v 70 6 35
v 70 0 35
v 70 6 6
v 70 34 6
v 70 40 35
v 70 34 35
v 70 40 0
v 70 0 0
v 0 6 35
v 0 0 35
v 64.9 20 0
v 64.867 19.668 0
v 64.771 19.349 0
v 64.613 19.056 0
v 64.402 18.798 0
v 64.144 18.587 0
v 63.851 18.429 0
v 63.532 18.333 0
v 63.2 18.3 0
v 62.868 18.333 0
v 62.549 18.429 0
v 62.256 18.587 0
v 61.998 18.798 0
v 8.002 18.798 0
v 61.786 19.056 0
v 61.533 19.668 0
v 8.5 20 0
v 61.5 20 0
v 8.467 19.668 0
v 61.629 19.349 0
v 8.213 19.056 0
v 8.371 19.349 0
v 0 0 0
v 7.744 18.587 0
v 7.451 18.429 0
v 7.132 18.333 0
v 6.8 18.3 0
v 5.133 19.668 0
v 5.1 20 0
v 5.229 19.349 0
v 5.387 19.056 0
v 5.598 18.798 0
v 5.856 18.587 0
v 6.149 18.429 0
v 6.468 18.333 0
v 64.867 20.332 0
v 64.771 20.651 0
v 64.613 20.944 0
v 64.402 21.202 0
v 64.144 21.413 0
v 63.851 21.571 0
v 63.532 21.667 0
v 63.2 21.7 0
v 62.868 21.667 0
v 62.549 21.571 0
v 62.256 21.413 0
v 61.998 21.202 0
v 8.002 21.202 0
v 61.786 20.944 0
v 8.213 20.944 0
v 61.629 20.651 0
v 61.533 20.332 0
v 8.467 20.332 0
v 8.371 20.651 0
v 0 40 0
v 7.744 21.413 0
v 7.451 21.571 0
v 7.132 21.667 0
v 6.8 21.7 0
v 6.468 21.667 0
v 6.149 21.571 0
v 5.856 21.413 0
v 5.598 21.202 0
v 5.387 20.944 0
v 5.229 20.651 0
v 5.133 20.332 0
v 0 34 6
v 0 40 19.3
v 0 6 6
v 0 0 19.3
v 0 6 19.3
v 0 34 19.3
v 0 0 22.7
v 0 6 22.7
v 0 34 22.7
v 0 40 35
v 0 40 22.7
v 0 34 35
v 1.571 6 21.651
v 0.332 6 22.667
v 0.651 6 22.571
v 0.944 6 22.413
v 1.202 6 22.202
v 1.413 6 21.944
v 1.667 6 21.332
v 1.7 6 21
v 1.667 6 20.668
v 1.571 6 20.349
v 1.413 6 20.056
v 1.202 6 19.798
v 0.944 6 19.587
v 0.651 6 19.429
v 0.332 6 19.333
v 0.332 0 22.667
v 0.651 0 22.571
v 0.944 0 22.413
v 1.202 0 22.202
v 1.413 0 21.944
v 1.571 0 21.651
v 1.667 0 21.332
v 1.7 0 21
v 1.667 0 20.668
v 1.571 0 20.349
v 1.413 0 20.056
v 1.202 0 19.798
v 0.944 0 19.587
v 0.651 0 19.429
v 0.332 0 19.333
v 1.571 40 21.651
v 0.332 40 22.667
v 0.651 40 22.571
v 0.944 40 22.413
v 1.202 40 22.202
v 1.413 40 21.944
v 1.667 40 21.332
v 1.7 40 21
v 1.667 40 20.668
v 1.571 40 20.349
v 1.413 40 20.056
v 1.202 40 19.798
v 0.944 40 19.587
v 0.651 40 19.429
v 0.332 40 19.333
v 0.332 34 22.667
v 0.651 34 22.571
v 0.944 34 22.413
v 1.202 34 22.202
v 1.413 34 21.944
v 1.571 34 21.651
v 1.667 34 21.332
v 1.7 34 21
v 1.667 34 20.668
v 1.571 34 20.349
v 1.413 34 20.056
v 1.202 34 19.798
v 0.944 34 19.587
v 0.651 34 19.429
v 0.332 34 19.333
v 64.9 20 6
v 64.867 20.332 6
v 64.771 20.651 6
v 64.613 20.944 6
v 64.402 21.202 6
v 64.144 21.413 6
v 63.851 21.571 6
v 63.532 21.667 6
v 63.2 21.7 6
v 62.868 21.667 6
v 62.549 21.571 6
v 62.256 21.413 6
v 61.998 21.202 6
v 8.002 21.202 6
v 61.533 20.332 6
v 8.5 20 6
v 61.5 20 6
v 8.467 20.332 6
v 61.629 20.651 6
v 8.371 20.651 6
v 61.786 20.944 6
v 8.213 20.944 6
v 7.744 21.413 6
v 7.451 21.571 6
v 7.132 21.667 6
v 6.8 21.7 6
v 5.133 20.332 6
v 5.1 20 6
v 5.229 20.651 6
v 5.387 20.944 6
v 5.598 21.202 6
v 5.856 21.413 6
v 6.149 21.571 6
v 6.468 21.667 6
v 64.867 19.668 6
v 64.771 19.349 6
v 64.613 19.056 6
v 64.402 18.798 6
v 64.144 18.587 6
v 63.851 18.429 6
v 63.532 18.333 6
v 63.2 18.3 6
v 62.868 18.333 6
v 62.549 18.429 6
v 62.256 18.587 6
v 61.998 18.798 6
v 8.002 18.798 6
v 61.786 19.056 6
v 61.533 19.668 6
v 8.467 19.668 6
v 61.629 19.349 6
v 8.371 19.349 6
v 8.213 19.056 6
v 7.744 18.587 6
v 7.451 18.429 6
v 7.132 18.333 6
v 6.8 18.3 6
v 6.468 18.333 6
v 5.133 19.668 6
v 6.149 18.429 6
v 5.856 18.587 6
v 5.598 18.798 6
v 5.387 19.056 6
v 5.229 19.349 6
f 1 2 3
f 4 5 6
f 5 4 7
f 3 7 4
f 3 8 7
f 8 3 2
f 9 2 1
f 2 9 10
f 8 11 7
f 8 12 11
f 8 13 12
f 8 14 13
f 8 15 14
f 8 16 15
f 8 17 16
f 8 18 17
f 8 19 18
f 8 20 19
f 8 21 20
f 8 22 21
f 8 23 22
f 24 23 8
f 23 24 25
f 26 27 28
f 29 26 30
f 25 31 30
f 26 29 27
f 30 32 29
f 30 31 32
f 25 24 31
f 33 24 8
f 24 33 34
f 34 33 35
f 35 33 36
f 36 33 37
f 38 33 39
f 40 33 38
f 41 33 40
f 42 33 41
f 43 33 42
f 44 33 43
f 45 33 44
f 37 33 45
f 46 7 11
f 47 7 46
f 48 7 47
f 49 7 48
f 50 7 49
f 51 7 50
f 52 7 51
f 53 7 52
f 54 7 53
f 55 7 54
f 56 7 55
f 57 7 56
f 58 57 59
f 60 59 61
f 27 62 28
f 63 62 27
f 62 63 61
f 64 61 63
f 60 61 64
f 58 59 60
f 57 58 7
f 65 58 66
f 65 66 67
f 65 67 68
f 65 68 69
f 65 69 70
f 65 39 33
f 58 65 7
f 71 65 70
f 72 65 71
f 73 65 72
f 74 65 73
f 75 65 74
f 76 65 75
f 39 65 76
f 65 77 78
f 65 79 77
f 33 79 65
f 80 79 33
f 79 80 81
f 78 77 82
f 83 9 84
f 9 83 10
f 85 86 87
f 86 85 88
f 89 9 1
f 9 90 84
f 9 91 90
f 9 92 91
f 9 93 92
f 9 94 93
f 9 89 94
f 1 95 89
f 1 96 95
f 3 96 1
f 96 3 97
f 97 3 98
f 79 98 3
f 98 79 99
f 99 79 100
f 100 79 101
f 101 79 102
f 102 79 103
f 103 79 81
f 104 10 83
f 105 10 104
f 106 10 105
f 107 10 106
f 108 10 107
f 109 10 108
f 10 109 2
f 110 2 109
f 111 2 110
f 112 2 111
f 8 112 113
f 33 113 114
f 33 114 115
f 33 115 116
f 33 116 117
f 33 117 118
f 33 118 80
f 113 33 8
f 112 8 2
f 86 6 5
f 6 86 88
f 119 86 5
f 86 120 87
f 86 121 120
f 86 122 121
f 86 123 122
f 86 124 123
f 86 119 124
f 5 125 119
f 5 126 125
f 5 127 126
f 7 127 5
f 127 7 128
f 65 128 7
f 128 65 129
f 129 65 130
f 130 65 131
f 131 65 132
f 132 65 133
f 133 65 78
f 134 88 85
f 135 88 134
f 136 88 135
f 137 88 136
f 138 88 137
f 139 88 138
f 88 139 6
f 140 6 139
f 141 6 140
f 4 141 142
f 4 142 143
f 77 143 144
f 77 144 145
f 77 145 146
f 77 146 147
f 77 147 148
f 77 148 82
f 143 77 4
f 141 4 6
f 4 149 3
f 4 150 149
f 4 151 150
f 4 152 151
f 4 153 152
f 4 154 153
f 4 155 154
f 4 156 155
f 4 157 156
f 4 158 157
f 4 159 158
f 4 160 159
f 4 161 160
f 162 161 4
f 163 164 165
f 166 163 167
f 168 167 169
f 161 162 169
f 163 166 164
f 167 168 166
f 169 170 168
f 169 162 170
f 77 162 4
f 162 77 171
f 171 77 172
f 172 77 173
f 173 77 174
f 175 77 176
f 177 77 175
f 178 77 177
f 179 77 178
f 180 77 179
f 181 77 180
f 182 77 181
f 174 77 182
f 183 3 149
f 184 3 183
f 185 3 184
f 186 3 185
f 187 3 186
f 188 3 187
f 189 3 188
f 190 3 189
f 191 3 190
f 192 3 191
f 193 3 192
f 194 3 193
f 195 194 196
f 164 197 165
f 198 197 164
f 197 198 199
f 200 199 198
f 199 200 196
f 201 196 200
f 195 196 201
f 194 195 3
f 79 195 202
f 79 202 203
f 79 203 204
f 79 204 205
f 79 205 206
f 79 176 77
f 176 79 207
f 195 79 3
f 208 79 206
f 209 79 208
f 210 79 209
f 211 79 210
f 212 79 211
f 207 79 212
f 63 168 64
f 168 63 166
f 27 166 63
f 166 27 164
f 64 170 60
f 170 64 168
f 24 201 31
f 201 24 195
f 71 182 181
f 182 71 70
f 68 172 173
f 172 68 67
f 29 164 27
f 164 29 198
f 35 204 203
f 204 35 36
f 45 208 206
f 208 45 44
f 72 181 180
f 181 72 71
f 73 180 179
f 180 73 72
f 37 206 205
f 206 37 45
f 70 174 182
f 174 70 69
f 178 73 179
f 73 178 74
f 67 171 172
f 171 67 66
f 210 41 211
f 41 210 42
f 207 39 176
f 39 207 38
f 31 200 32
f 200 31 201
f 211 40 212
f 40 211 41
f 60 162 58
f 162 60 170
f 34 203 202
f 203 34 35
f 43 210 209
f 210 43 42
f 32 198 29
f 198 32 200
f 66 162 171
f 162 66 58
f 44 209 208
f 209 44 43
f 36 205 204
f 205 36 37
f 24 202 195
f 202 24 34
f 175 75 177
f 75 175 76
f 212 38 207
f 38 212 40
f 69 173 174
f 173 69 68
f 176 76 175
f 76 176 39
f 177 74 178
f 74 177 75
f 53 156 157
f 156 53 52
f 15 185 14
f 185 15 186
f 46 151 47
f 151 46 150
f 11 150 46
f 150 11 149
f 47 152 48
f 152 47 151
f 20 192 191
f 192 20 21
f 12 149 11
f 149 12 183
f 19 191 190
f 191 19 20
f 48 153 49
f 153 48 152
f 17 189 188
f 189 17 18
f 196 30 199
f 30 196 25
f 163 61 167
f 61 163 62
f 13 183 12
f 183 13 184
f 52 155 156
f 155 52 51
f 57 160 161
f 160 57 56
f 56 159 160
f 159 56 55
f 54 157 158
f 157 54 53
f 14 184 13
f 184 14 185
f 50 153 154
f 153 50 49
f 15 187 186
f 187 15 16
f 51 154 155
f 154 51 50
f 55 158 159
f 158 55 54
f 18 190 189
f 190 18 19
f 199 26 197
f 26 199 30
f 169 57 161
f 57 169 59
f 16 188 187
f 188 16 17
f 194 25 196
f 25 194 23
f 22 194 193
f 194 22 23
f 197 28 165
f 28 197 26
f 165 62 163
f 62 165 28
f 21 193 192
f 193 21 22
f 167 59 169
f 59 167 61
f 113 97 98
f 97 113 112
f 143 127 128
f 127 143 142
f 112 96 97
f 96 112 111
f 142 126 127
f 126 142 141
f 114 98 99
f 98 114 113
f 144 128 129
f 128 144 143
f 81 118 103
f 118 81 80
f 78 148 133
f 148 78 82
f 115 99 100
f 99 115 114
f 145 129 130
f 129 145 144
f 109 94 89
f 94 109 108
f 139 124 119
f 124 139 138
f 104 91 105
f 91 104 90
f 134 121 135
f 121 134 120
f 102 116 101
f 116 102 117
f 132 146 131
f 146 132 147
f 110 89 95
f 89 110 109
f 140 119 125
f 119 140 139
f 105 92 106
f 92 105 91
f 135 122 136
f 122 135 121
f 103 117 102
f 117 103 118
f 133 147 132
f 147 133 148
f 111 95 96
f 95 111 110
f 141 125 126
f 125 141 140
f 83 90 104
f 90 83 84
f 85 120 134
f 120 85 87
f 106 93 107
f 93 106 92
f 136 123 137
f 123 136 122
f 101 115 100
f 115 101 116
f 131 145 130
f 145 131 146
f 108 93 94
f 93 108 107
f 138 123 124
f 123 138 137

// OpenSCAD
$fn = 32;

// ----------------------------------------------------------------------
// U-bracket: 70 x 40 x 35 mm
// ----------------------------------------------------------------------

// --- parameters (mm) ---
rail_len = 70;            // outer length, X
jaw_w = 40;               // outer width, Y
jaw_h = 35;               // upright height, Z
web_t = 6;                // wall thickness
hole_d = 3.4;             // clearance for M3

module hole_z(px, py) {
  translate([px, py, -2.5]) cylinder(h = web_t + 5, d = hole_d);
}
module hole_y_pz(pz) {
  /* through both uprights along Y */
  translate([0, -2.5, pz]) rotate([-90, 0, 0]) cylinder(h = jaw_w + 5, d = hole_d);
}

module base() {
  cube([rail_len, jaw_w, web_t]);
}

module uprights() {
  cube([rail_len, web_t, jaw_h]);
  translate([0, jaw_w - web_t, 0]) cube([rail_len, web_t, jaw_h]);
}

difference() {
  union() {
    base();
    uprights();
  }
  hole_z(6.8, 20);
  hole_z(63.2, 20);
  hole_y_pz(21);
}
